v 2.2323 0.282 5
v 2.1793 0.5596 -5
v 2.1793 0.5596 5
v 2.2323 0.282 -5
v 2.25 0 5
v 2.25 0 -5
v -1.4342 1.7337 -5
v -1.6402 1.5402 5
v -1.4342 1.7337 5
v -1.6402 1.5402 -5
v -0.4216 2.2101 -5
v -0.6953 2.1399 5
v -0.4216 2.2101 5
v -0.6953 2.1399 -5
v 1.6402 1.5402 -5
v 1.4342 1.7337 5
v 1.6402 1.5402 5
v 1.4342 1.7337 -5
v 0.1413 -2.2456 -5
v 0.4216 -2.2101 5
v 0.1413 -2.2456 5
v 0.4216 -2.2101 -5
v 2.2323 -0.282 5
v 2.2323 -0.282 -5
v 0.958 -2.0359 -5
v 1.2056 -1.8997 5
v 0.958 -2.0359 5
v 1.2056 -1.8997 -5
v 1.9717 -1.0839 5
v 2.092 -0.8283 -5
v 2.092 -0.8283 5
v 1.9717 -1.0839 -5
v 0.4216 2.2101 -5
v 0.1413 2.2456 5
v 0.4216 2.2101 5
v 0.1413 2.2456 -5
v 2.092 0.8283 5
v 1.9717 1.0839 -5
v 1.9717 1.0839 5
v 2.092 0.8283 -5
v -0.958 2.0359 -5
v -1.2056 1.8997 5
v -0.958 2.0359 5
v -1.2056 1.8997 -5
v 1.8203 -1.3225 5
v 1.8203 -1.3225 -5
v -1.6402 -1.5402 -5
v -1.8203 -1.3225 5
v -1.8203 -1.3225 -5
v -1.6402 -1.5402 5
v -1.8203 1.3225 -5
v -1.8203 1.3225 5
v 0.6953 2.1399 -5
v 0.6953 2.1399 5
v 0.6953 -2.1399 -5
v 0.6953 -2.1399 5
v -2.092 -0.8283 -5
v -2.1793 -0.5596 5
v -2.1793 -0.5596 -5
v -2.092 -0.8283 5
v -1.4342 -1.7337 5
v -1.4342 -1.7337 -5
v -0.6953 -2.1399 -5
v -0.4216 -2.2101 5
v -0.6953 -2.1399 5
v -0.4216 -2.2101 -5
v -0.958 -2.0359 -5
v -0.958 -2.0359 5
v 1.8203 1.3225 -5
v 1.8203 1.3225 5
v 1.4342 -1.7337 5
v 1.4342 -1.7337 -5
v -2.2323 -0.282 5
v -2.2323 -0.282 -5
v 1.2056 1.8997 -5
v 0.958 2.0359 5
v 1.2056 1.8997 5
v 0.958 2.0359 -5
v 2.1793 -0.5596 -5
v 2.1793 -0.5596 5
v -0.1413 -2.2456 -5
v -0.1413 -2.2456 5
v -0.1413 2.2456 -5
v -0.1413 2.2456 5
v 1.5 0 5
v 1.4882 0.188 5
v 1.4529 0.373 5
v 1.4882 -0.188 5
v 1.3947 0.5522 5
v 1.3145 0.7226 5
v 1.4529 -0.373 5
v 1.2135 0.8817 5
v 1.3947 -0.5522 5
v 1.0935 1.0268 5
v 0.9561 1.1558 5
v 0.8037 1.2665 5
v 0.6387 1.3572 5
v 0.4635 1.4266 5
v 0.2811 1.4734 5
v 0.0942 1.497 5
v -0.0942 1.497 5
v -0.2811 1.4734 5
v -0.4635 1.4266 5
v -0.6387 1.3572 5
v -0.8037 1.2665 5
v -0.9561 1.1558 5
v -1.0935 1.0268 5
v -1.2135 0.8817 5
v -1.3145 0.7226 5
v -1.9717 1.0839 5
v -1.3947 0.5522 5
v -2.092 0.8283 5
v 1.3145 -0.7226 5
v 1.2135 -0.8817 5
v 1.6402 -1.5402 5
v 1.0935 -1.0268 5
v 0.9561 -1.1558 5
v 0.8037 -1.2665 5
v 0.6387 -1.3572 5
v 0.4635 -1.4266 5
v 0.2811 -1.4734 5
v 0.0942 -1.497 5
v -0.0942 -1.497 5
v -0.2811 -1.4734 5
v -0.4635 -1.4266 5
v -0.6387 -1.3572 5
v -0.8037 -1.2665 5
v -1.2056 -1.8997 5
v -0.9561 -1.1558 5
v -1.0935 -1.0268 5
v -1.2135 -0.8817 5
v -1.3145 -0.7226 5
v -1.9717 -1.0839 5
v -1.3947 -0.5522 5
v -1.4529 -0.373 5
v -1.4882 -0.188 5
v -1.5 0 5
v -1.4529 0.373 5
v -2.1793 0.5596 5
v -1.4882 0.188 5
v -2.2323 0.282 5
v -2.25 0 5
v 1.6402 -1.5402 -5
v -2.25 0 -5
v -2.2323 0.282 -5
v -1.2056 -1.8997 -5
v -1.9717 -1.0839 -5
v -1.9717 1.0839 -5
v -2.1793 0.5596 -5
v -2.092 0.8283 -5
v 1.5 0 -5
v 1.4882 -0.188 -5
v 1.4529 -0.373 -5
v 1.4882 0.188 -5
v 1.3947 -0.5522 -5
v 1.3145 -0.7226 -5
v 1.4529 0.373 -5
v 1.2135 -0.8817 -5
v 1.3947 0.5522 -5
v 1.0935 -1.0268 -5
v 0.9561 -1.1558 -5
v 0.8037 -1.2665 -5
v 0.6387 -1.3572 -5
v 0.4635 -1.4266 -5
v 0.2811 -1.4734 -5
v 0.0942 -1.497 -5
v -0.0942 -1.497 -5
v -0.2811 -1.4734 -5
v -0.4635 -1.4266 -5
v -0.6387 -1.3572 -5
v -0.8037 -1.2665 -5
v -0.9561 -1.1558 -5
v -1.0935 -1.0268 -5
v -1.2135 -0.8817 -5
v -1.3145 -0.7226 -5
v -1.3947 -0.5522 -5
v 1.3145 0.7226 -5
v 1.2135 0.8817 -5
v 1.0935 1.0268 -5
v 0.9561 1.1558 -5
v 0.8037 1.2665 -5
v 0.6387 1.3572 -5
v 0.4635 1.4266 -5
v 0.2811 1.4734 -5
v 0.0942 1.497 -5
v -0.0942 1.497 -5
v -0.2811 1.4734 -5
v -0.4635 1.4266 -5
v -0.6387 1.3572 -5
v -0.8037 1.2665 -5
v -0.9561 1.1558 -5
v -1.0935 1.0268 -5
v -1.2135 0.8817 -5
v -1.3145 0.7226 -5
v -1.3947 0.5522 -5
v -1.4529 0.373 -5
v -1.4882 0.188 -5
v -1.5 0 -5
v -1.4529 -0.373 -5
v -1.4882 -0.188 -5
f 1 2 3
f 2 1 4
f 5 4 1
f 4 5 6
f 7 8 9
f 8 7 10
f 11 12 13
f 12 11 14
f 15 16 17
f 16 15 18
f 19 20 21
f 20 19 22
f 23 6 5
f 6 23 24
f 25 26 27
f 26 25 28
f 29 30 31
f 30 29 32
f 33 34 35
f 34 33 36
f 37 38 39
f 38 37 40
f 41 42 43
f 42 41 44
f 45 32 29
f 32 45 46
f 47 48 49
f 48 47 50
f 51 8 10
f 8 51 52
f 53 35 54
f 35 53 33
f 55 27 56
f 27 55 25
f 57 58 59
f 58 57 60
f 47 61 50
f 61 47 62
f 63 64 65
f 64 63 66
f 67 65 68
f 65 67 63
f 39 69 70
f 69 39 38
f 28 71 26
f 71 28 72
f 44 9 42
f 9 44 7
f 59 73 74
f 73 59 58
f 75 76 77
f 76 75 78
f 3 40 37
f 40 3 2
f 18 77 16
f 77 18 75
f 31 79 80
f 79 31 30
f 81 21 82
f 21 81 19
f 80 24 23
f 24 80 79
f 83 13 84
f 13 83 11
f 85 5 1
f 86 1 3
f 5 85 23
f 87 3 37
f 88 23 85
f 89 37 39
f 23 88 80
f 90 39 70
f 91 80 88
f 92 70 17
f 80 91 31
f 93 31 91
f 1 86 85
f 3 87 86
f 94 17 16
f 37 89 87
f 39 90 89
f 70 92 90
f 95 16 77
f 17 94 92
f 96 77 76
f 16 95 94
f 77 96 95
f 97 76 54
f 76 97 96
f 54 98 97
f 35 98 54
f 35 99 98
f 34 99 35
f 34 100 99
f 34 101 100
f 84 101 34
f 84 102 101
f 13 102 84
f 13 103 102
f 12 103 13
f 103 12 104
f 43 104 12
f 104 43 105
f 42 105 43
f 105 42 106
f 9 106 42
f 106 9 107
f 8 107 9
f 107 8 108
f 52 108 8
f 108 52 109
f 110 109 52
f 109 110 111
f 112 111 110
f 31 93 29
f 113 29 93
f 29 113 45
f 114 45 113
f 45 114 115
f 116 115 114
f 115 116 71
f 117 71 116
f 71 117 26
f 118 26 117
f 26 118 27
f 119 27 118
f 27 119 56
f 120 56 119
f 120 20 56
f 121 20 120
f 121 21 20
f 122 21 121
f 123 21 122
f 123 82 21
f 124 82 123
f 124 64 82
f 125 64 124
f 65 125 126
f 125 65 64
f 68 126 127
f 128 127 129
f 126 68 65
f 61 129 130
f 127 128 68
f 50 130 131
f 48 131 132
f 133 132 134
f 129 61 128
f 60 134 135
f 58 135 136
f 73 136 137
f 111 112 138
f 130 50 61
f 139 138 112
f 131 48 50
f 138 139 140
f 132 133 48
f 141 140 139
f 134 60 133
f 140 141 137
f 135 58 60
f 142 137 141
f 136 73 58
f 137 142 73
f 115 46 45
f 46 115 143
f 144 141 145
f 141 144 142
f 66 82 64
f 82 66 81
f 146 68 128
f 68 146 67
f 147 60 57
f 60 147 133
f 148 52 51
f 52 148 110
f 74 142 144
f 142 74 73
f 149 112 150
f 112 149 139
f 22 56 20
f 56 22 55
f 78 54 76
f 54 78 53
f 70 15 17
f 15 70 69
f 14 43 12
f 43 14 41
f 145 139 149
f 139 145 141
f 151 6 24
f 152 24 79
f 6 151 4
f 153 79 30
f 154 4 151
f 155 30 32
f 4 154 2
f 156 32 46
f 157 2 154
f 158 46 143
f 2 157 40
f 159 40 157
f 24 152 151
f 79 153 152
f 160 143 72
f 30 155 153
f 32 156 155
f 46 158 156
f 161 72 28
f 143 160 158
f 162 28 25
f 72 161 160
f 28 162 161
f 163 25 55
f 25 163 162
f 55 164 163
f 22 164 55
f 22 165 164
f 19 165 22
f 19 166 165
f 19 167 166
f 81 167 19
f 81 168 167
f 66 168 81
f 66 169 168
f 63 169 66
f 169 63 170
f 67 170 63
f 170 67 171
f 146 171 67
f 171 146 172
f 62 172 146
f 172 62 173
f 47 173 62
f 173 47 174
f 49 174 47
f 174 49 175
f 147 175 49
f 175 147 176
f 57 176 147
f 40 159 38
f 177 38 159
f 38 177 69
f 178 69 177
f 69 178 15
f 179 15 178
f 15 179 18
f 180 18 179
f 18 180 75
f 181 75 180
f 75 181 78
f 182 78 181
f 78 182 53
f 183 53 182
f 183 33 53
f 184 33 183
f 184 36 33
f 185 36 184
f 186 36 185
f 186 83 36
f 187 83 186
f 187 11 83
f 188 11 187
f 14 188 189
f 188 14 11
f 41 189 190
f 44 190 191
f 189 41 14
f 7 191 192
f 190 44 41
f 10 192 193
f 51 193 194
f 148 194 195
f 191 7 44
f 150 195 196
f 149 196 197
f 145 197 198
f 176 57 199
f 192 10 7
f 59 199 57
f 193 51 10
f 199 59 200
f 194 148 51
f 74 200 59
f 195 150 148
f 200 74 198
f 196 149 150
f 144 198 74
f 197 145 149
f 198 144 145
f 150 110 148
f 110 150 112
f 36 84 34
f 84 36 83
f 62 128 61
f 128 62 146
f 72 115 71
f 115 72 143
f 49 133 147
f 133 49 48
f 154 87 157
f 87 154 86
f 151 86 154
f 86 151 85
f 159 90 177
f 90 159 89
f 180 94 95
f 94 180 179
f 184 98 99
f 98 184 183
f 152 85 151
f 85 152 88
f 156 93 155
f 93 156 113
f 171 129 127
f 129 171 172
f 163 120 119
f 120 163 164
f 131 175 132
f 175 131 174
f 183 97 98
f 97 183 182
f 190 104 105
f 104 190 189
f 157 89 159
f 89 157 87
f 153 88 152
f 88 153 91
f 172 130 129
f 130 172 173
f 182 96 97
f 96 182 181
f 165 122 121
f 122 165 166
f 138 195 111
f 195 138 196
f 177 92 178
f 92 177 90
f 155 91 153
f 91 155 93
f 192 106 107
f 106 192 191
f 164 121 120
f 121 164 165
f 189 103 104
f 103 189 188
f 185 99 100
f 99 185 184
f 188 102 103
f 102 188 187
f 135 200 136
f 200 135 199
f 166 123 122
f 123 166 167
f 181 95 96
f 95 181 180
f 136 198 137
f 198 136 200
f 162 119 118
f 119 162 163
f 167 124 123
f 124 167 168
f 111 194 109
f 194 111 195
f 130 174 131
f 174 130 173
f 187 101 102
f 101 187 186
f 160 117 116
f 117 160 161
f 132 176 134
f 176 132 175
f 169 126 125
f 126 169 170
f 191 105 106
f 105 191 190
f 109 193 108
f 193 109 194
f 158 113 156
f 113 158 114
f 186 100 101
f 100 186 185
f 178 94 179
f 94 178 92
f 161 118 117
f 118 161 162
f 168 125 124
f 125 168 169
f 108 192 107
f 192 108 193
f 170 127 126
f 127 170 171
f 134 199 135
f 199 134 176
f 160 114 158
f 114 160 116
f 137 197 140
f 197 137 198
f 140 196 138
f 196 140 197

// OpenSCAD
$fn = 50;


difference() {
	union() {
		translate(v = [0, 0, -5.0000000000]) {
			cylinder(h = 10, r = 2.2500000000);
		}
	}
	union() {
		translate(v = [0, 0, -100.0000000000]) {
			cylinder(h = 200, r = 1.5000000000);
		}
	}
}
